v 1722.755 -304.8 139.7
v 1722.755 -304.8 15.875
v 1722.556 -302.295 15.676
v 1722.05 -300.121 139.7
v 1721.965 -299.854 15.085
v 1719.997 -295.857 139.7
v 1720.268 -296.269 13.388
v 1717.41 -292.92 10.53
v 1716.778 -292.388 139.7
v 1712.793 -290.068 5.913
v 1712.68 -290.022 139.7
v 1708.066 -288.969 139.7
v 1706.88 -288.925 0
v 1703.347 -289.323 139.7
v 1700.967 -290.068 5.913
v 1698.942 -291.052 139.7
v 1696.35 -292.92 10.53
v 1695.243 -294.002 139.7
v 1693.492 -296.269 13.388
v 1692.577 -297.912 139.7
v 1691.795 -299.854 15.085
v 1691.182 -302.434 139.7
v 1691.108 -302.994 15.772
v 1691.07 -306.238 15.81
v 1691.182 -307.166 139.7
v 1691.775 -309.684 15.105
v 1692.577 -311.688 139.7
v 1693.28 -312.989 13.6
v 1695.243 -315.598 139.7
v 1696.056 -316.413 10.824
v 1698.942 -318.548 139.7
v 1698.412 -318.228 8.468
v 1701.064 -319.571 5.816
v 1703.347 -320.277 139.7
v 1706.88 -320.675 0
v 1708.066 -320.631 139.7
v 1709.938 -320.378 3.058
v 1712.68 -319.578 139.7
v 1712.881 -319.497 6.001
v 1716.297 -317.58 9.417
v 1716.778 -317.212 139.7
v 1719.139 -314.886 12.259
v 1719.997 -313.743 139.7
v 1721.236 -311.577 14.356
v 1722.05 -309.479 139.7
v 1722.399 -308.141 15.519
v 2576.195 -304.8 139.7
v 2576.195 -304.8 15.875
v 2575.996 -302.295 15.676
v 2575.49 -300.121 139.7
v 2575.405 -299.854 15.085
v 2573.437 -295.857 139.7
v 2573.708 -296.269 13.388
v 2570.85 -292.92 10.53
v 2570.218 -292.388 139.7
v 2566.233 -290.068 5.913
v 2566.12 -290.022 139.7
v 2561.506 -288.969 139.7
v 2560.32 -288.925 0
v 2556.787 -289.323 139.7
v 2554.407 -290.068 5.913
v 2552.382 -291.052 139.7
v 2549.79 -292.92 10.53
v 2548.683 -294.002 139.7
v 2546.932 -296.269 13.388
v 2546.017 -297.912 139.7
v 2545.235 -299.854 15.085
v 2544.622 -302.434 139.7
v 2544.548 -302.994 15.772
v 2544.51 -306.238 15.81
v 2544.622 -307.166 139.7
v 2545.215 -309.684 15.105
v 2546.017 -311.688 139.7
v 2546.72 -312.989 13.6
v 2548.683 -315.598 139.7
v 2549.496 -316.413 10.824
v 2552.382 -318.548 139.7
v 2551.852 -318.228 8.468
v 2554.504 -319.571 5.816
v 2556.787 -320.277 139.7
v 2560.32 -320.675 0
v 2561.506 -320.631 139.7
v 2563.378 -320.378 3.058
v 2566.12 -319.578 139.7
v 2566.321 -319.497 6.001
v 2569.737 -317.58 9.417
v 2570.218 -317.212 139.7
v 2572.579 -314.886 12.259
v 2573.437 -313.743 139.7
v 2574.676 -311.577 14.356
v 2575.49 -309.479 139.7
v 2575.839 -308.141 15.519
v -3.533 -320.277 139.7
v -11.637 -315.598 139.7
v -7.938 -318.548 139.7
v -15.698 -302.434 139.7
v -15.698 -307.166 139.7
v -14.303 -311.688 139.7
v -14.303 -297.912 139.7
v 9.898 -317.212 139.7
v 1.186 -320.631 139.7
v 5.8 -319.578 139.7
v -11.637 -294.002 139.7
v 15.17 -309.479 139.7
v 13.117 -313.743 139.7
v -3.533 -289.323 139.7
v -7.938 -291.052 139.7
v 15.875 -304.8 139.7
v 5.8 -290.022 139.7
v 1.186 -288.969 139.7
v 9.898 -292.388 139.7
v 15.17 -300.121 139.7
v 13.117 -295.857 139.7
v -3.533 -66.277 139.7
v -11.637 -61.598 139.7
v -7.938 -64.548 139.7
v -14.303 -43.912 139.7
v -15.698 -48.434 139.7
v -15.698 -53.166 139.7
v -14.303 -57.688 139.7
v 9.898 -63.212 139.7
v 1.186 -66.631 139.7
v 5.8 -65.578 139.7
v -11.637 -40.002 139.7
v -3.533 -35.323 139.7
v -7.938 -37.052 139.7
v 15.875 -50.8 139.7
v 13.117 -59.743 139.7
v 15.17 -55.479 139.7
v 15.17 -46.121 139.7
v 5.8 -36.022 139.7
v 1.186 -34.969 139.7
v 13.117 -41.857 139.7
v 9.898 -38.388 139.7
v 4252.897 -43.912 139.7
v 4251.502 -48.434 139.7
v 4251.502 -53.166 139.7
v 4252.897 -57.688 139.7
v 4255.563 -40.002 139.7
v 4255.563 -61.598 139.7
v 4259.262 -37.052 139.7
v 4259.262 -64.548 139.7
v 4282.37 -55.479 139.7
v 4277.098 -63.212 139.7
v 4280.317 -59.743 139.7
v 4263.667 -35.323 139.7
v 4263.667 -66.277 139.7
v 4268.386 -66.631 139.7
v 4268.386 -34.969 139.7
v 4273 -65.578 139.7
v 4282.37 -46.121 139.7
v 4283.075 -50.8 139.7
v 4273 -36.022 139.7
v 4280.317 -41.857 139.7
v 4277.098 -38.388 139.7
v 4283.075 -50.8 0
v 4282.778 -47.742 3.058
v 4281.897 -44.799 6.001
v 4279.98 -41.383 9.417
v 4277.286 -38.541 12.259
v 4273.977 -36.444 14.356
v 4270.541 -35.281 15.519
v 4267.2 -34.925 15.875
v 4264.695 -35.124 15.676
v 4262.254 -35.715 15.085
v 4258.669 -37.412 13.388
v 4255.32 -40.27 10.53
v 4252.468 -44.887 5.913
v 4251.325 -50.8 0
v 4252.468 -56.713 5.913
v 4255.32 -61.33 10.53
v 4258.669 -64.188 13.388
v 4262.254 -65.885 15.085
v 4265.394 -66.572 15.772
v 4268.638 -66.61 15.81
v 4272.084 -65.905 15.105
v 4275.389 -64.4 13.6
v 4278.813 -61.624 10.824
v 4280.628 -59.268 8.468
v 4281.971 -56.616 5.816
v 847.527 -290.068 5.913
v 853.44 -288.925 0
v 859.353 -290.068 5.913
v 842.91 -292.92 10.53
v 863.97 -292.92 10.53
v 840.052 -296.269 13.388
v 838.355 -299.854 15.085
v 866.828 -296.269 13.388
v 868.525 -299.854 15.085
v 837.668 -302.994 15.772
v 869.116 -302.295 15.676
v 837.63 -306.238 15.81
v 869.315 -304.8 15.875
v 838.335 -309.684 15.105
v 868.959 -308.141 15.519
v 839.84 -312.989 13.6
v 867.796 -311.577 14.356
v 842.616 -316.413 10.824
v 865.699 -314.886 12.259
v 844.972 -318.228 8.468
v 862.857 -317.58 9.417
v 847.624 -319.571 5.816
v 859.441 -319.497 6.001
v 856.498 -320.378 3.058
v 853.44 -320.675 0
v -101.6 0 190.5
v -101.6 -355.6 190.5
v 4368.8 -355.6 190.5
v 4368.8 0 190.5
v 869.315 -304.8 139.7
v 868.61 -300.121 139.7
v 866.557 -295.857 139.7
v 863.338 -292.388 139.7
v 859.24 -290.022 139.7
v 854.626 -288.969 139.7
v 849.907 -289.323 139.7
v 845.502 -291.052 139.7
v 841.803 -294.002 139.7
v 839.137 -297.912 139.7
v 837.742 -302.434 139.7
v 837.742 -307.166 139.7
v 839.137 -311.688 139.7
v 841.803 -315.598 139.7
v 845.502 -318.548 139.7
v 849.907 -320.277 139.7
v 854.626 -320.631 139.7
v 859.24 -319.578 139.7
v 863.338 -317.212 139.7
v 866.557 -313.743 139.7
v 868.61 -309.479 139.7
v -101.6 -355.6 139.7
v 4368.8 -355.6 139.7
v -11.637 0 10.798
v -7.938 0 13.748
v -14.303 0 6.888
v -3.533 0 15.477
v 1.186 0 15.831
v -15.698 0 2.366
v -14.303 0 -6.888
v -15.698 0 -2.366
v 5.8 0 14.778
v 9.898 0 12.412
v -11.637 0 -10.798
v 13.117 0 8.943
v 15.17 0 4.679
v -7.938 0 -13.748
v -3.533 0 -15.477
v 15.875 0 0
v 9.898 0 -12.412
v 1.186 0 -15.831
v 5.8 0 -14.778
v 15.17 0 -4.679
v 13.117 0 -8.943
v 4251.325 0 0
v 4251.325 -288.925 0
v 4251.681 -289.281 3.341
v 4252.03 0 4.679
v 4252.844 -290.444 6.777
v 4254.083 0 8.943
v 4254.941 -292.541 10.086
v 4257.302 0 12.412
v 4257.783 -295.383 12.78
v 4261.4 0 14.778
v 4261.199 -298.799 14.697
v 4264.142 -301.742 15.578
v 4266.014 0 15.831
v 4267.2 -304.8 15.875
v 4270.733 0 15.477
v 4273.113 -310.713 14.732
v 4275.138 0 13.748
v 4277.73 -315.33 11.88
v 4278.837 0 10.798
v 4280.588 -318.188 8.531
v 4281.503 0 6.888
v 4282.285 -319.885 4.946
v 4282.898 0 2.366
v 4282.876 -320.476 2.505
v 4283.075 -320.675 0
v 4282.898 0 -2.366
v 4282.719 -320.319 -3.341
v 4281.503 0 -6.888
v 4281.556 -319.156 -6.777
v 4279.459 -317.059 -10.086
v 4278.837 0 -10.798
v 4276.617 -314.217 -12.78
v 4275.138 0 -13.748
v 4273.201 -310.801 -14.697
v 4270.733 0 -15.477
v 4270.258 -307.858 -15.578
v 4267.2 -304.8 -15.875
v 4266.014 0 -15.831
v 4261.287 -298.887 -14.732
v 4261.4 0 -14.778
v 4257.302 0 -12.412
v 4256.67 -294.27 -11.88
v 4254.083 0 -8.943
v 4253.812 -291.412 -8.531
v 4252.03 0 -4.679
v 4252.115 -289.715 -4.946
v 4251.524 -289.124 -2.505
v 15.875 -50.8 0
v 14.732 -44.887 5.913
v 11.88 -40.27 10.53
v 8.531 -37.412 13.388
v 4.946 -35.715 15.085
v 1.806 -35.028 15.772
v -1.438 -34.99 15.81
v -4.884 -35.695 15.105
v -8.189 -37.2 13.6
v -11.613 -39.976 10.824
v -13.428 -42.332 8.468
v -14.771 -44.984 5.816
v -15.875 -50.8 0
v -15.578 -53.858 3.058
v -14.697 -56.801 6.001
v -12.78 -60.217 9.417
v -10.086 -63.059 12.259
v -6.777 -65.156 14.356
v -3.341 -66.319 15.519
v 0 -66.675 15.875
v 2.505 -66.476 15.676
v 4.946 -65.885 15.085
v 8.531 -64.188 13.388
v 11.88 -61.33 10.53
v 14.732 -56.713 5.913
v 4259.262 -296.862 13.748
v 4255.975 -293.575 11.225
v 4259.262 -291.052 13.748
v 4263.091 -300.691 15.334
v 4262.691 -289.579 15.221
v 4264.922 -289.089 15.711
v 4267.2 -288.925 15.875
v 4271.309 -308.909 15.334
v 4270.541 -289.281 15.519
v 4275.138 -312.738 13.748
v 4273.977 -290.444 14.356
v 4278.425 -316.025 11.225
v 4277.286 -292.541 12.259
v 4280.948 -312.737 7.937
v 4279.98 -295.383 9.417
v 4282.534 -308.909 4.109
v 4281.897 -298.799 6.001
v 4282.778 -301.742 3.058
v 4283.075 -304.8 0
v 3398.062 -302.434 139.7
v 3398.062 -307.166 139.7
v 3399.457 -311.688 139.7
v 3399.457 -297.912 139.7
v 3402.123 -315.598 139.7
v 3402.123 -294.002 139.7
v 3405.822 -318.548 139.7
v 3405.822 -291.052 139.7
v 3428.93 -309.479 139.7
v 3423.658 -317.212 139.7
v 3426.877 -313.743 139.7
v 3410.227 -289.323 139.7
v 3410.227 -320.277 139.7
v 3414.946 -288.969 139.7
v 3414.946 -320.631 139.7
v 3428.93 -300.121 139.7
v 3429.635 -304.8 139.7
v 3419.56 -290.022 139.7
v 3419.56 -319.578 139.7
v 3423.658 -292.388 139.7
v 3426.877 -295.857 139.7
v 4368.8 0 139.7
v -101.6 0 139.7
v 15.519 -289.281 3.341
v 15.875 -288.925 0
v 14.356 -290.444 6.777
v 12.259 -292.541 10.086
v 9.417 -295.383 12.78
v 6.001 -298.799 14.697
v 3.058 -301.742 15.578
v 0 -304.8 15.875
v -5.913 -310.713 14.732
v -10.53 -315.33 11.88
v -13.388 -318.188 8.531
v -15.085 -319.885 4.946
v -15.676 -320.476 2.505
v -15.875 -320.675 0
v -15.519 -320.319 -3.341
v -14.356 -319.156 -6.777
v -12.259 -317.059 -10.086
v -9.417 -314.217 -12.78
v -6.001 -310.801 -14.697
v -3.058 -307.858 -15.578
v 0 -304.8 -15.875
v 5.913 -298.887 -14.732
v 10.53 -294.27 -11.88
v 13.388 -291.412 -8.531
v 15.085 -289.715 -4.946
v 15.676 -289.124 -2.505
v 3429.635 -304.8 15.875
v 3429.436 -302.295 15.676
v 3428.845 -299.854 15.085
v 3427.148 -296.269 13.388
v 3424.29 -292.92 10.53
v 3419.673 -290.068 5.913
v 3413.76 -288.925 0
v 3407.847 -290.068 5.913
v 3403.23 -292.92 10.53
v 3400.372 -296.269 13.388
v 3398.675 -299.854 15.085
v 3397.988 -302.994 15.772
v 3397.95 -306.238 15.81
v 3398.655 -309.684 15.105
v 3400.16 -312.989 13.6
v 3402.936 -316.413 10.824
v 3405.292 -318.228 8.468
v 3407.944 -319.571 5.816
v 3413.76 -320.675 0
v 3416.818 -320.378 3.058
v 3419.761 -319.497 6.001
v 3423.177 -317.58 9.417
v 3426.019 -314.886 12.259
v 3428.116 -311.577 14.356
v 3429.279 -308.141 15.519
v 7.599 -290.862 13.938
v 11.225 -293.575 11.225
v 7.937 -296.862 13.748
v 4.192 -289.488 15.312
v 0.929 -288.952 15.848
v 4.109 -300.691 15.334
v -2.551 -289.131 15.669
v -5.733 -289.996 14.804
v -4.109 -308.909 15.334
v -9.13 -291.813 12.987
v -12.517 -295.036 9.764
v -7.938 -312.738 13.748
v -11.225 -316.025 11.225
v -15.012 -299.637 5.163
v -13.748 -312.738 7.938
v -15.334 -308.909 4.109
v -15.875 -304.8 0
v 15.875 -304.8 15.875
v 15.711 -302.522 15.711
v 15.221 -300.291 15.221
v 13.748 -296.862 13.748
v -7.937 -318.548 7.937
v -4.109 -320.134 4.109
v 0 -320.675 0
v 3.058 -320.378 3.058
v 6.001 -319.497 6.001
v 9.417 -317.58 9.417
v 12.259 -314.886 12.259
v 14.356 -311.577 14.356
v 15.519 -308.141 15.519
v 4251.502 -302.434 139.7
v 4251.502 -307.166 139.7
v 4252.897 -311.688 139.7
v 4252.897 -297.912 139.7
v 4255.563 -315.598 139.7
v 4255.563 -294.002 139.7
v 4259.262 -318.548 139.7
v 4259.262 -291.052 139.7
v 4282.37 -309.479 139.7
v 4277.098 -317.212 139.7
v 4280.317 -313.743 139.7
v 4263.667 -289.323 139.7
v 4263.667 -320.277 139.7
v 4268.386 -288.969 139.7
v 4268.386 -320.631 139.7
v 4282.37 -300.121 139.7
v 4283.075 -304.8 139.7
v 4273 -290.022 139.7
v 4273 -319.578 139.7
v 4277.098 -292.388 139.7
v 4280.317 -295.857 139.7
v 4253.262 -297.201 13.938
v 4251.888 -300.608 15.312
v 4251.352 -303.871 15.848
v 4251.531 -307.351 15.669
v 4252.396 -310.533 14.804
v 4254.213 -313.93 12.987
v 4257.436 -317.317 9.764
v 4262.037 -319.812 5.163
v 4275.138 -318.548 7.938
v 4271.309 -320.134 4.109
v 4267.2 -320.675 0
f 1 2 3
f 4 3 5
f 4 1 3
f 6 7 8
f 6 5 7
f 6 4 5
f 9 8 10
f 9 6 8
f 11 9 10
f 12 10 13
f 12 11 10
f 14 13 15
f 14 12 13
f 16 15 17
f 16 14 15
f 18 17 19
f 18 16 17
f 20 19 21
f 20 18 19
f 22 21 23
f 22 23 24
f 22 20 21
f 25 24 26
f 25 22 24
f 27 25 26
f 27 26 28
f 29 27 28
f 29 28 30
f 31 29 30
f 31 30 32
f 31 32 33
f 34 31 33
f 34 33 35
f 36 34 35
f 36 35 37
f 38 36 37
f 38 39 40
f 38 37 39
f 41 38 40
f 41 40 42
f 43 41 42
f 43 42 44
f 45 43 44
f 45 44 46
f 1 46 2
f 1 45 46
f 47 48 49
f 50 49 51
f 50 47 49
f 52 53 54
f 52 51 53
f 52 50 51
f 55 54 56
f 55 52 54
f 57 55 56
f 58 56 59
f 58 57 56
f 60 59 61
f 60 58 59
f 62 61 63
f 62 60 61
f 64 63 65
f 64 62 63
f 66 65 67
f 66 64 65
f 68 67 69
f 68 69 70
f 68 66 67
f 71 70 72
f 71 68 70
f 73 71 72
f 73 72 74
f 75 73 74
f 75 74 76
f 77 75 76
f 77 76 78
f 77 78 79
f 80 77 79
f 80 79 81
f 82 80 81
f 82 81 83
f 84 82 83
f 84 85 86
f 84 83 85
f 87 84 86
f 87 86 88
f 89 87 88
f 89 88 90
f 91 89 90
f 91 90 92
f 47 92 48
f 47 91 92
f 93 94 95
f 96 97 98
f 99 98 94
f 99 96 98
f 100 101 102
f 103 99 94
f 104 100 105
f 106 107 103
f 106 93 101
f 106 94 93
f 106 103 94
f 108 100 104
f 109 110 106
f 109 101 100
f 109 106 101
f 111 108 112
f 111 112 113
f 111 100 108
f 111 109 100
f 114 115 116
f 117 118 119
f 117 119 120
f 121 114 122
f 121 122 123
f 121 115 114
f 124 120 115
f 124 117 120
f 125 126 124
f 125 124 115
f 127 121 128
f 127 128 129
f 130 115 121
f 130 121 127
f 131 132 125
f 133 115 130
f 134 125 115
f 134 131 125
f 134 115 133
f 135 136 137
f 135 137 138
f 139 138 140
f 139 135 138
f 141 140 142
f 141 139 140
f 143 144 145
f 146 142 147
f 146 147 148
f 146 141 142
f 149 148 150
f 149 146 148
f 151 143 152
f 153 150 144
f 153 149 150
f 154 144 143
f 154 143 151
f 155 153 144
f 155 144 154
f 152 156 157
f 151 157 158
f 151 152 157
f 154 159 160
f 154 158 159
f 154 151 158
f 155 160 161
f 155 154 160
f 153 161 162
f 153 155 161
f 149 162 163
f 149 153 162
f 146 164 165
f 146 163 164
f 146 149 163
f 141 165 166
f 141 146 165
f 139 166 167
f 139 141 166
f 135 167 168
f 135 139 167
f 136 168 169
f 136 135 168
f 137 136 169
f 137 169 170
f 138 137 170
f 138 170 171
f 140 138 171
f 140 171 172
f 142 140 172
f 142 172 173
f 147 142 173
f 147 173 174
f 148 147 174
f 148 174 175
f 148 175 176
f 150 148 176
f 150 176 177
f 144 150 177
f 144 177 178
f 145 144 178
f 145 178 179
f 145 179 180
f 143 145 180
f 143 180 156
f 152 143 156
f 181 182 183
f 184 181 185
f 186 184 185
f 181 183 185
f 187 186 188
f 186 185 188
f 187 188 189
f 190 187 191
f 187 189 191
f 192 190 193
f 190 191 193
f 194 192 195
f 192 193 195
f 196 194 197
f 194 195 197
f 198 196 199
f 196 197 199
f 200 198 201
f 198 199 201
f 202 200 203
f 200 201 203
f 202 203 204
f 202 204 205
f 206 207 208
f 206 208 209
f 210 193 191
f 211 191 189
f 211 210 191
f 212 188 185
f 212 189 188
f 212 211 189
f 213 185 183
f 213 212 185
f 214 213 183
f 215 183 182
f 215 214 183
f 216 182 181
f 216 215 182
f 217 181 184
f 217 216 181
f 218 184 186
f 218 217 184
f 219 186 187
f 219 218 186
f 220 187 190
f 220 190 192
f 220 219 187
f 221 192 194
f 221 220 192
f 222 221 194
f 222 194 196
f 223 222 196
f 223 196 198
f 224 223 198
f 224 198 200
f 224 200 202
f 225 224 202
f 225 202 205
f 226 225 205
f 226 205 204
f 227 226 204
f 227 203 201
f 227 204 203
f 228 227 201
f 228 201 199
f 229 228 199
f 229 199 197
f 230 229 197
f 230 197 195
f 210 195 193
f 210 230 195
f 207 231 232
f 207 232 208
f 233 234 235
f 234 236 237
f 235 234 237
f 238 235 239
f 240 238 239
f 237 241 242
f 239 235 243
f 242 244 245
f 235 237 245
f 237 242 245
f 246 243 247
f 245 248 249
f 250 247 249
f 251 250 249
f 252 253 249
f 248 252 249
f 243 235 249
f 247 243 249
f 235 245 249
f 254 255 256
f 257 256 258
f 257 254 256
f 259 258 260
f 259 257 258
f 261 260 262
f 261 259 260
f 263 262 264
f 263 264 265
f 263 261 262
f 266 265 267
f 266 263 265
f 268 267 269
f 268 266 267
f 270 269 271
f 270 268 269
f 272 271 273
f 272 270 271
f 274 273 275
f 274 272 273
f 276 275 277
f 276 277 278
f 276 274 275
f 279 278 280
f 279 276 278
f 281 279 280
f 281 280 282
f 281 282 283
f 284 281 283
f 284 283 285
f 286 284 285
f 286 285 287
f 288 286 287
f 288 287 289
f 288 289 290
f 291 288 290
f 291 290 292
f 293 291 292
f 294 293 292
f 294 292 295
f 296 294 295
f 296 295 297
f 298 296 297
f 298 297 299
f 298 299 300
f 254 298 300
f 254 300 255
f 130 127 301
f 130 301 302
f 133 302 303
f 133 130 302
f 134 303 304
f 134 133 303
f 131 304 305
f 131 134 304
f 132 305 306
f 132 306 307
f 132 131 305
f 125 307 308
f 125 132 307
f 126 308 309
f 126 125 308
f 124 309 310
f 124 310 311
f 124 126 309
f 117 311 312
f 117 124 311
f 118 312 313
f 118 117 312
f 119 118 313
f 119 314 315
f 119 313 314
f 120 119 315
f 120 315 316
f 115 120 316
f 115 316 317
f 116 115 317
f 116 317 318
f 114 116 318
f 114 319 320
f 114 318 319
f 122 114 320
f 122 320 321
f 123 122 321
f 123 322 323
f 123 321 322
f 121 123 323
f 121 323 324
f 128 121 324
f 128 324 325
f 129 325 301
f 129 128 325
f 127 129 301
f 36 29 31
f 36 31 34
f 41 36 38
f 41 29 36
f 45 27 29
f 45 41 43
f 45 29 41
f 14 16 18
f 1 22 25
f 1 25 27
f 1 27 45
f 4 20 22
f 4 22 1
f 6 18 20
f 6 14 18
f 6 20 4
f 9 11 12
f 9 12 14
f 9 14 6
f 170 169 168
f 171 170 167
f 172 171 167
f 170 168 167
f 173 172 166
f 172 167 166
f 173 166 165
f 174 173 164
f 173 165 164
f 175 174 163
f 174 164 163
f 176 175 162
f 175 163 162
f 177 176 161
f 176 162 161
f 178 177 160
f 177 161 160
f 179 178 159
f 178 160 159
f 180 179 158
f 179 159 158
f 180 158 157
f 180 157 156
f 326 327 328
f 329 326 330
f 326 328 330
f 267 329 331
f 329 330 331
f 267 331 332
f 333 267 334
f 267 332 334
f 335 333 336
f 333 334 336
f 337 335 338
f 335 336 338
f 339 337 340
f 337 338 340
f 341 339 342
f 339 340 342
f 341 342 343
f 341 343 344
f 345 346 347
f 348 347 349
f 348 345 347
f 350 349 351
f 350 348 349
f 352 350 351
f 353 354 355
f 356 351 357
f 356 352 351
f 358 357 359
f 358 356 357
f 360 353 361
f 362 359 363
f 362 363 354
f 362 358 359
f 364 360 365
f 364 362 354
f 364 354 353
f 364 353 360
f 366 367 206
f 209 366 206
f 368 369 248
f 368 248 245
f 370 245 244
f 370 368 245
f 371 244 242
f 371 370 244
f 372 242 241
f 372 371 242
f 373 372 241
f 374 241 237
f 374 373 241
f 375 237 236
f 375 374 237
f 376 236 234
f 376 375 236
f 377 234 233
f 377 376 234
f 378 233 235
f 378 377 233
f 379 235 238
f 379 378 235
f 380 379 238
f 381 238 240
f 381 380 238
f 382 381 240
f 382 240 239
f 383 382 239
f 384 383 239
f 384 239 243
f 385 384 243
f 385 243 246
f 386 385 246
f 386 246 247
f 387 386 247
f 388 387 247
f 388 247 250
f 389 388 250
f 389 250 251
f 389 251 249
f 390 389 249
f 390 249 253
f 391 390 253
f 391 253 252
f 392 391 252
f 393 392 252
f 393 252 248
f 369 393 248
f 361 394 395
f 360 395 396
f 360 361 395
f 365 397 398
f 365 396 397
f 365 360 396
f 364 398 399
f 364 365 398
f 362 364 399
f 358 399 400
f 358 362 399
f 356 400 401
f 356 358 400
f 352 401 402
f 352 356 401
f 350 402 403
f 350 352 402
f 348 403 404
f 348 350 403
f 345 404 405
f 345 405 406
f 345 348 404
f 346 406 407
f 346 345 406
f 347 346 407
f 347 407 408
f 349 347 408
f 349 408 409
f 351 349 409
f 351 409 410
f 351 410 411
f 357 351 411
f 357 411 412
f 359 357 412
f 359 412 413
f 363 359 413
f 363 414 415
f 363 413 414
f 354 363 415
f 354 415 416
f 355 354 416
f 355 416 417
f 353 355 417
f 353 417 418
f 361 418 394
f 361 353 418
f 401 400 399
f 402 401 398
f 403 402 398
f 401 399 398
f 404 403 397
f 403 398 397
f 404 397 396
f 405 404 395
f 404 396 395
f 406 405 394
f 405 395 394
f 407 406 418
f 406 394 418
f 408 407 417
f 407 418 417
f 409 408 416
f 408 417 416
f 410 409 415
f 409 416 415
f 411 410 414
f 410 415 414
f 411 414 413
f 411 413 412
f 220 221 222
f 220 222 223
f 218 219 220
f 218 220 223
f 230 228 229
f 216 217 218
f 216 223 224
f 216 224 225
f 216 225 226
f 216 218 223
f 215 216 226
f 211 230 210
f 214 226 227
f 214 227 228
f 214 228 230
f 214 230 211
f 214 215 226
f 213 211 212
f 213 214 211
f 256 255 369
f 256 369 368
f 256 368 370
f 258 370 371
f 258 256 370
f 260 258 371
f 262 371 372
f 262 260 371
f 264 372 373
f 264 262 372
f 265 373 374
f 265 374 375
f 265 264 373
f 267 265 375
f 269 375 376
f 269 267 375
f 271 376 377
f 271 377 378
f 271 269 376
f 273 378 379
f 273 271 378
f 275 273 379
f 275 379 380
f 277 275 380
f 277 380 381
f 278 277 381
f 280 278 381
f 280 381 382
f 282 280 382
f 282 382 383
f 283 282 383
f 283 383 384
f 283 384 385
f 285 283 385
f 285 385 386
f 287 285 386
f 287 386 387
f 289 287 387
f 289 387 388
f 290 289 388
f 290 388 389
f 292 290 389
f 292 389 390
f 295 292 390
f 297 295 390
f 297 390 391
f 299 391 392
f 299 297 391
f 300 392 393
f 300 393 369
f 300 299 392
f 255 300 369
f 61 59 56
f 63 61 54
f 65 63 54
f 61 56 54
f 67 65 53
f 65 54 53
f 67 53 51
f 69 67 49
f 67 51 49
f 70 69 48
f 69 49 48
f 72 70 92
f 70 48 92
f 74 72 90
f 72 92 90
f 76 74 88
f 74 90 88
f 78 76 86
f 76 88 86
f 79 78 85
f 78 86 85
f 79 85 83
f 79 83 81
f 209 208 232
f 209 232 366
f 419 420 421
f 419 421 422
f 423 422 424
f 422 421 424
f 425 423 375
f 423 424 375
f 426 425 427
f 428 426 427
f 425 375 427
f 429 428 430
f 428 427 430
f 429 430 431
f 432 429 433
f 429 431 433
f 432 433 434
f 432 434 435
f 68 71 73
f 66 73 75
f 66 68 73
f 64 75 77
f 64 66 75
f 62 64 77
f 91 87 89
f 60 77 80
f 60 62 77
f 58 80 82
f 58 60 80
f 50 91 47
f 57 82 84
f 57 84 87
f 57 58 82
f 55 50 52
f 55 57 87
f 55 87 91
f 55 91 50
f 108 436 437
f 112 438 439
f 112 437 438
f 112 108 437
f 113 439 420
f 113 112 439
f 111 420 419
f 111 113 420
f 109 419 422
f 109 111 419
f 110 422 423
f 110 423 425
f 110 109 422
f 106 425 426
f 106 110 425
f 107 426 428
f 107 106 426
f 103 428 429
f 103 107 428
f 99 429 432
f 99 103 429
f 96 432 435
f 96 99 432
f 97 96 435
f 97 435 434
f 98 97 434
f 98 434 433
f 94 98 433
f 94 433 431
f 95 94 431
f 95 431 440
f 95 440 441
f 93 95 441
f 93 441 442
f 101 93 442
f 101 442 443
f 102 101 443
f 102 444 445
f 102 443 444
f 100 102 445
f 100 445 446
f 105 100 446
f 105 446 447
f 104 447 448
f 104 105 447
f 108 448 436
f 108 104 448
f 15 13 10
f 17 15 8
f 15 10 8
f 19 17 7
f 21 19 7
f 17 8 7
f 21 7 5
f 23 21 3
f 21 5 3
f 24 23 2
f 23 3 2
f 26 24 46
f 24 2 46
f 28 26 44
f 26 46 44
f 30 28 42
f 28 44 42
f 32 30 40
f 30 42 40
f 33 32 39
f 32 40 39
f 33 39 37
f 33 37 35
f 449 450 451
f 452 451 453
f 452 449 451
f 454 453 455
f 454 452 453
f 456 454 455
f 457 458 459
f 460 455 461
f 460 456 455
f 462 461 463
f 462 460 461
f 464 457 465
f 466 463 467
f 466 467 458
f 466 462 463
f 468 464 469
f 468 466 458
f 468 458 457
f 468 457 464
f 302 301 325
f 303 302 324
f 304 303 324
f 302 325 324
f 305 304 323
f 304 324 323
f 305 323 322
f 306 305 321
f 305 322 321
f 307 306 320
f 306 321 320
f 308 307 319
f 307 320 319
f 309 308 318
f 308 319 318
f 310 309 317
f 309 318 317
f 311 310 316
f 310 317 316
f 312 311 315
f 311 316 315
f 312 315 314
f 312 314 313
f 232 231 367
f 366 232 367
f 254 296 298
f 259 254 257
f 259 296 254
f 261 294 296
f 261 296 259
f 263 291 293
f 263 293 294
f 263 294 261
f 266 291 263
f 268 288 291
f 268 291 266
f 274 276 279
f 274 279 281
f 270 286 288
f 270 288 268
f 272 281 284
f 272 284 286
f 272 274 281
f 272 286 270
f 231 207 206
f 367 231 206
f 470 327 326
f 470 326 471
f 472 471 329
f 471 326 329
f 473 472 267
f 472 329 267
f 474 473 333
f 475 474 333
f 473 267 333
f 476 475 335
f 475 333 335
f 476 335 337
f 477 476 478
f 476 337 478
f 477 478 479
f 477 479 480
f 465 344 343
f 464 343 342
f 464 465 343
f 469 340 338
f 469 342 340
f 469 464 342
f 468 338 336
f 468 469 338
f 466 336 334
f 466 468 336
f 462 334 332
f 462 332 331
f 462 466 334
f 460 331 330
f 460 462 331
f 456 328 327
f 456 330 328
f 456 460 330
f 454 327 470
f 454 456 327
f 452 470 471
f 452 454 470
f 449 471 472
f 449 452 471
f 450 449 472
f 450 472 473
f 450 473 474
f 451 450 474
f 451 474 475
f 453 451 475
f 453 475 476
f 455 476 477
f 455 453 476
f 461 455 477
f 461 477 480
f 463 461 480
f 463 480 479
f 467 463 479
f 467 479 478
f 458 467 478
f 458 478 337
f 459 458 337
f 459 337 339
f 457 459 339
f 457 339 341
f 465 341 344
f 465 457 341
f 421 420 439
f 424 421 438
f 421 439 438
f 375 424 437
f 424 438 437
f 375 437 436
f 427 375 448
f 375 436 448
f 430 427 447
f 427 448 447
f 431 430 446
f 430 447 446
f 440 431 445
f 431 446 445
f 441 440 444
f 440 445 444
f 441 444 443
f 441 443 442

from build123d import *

# Parameters (mm, degrees)
F1_R     = 15.875
F4_R     = 15.875
F7_W     = 355.6
F7_H     = 50.8
F8_DEPTH = 4470.4


with BuildPart() as f2:
    # F2: sweep along a path in F0
    with BuildLine(Plane.XY) as f2_path:
        Line((0, 0), (0, -304.8))
        Line((0, -304.8), (4267.2, -304.8))
        Line((4267.2, -304.8), (4267.2, 0))
    # F1 (on Front) → F2 (sweep)
    with BuildSketch(Plane.XZ):
        Circle(F1_R)
    sweep(path=f2_path.line, transition=Transition.RIGHT)


with BuildPart() as f5:
    # F4 (on offset) → F5 (new body, up to the next surface of F2)
    with BuildSketch(Plane.XY.offset(139.7)):
        with Locations((0, -50.8)):
            Circle(F4_R)
    extrude(until=Until.NEXT, target=f2.part, dir=(0, 0, -1))


with BuildPart() as f5b:
    # F4 (on offset) → F5, piece 2 (new body, up to the next surface of F2)
    with BuildSketch(Plane.XY.offset(139.7)):
        with Locations((0, -304.8)):
            Circle(F4_R)
    extrude(until=Until.NEXT, target=f2.part, dir=(0, 0, -1))


with BuildPart() as f5c:
    # F4 (on offset) → F5, piece 3 (new body, up to the next surface of F2)
    with BuildSketch(Plane.XY.offset(139.7)):
        with Locations((4267.2, -50.8)):
            Circle(F4_R)
    extrude(until=Until.NEXT, target=f2.part, dir=(0, 0, -1))


with BuildPart() as f5d:
    # F4 (on offset) → F5, piece 4 (new body, up to the next surface of F2)
    with BuildSketch(Plane.XY.offset(139.7)):
        with Locations((4267.2, -304.8)):
            Circle(F4_R)
    extrude(until=Until.NEXT, target=f2.part, dir=(0, 0, -1))


with BuildPart() as f5e:
    # F4 (on offset) → F5, piece 5 (new body, up to the next surface of F2)
    with BuildSketch(Plane.XY.offset(139.7)):
        with Locations((853.44, -304.8)):
            Circle(F4_R)
    extrude(until=Until.NEXT, target=f2.part, dir=(0, 0, -1))


with BuildPart() as f5f:
    # F4 (on offset) → F5, piece 6 (new body, up to the next surface of F2)
    with BuildSketch(Plane.XY.offset(139.7)):
        with Locations((1706.88, -304.8)):
            Circle(F4_R)
    extrude(until=Until.NEXT, target=f2.part, dir=(0, 0, -1))


with BuildPart() as f5g:
    # F4 (on offset) → F5, piece 7 (new body, up to the next surface of F2)
    with BuildSketch(Plane.XY.offset(139.7)):
        with Locations((2560.32, -304.8)):
            Circle(F4_R)
    extrude(until=Until.NEXT, target=f2.part, dir=(0, 0, -1))


with BuildPart() as f5h:
    # F4 (on offset) → F5, piece 8 (new body, up to the next surface of F2)
    with BuildSketch(Plane.XY.offset(139.7)):
        with Locations((3413.76, -304.8)):
            Circle(F4_R)
    extrude(until=Until.NEXT, target=f2.part, dir=(0, 0, -1))


with BuildPart() as f8:
    # F7 (on offset) → F8 (new body)
    with BuildSketch(Plane.YZ.offset(-101.6)):
        with Locations((-177.8, 165.1)):
            Rectangle(F7_W, F7_H)
    extrude(amount=F8_DEPTH)


solid = Compound([f2.part, f5.part, f5b.part, f5c.part, f5d.part, f5e.part, f5f.part, f5g.part, f5h.part, f8.part])
